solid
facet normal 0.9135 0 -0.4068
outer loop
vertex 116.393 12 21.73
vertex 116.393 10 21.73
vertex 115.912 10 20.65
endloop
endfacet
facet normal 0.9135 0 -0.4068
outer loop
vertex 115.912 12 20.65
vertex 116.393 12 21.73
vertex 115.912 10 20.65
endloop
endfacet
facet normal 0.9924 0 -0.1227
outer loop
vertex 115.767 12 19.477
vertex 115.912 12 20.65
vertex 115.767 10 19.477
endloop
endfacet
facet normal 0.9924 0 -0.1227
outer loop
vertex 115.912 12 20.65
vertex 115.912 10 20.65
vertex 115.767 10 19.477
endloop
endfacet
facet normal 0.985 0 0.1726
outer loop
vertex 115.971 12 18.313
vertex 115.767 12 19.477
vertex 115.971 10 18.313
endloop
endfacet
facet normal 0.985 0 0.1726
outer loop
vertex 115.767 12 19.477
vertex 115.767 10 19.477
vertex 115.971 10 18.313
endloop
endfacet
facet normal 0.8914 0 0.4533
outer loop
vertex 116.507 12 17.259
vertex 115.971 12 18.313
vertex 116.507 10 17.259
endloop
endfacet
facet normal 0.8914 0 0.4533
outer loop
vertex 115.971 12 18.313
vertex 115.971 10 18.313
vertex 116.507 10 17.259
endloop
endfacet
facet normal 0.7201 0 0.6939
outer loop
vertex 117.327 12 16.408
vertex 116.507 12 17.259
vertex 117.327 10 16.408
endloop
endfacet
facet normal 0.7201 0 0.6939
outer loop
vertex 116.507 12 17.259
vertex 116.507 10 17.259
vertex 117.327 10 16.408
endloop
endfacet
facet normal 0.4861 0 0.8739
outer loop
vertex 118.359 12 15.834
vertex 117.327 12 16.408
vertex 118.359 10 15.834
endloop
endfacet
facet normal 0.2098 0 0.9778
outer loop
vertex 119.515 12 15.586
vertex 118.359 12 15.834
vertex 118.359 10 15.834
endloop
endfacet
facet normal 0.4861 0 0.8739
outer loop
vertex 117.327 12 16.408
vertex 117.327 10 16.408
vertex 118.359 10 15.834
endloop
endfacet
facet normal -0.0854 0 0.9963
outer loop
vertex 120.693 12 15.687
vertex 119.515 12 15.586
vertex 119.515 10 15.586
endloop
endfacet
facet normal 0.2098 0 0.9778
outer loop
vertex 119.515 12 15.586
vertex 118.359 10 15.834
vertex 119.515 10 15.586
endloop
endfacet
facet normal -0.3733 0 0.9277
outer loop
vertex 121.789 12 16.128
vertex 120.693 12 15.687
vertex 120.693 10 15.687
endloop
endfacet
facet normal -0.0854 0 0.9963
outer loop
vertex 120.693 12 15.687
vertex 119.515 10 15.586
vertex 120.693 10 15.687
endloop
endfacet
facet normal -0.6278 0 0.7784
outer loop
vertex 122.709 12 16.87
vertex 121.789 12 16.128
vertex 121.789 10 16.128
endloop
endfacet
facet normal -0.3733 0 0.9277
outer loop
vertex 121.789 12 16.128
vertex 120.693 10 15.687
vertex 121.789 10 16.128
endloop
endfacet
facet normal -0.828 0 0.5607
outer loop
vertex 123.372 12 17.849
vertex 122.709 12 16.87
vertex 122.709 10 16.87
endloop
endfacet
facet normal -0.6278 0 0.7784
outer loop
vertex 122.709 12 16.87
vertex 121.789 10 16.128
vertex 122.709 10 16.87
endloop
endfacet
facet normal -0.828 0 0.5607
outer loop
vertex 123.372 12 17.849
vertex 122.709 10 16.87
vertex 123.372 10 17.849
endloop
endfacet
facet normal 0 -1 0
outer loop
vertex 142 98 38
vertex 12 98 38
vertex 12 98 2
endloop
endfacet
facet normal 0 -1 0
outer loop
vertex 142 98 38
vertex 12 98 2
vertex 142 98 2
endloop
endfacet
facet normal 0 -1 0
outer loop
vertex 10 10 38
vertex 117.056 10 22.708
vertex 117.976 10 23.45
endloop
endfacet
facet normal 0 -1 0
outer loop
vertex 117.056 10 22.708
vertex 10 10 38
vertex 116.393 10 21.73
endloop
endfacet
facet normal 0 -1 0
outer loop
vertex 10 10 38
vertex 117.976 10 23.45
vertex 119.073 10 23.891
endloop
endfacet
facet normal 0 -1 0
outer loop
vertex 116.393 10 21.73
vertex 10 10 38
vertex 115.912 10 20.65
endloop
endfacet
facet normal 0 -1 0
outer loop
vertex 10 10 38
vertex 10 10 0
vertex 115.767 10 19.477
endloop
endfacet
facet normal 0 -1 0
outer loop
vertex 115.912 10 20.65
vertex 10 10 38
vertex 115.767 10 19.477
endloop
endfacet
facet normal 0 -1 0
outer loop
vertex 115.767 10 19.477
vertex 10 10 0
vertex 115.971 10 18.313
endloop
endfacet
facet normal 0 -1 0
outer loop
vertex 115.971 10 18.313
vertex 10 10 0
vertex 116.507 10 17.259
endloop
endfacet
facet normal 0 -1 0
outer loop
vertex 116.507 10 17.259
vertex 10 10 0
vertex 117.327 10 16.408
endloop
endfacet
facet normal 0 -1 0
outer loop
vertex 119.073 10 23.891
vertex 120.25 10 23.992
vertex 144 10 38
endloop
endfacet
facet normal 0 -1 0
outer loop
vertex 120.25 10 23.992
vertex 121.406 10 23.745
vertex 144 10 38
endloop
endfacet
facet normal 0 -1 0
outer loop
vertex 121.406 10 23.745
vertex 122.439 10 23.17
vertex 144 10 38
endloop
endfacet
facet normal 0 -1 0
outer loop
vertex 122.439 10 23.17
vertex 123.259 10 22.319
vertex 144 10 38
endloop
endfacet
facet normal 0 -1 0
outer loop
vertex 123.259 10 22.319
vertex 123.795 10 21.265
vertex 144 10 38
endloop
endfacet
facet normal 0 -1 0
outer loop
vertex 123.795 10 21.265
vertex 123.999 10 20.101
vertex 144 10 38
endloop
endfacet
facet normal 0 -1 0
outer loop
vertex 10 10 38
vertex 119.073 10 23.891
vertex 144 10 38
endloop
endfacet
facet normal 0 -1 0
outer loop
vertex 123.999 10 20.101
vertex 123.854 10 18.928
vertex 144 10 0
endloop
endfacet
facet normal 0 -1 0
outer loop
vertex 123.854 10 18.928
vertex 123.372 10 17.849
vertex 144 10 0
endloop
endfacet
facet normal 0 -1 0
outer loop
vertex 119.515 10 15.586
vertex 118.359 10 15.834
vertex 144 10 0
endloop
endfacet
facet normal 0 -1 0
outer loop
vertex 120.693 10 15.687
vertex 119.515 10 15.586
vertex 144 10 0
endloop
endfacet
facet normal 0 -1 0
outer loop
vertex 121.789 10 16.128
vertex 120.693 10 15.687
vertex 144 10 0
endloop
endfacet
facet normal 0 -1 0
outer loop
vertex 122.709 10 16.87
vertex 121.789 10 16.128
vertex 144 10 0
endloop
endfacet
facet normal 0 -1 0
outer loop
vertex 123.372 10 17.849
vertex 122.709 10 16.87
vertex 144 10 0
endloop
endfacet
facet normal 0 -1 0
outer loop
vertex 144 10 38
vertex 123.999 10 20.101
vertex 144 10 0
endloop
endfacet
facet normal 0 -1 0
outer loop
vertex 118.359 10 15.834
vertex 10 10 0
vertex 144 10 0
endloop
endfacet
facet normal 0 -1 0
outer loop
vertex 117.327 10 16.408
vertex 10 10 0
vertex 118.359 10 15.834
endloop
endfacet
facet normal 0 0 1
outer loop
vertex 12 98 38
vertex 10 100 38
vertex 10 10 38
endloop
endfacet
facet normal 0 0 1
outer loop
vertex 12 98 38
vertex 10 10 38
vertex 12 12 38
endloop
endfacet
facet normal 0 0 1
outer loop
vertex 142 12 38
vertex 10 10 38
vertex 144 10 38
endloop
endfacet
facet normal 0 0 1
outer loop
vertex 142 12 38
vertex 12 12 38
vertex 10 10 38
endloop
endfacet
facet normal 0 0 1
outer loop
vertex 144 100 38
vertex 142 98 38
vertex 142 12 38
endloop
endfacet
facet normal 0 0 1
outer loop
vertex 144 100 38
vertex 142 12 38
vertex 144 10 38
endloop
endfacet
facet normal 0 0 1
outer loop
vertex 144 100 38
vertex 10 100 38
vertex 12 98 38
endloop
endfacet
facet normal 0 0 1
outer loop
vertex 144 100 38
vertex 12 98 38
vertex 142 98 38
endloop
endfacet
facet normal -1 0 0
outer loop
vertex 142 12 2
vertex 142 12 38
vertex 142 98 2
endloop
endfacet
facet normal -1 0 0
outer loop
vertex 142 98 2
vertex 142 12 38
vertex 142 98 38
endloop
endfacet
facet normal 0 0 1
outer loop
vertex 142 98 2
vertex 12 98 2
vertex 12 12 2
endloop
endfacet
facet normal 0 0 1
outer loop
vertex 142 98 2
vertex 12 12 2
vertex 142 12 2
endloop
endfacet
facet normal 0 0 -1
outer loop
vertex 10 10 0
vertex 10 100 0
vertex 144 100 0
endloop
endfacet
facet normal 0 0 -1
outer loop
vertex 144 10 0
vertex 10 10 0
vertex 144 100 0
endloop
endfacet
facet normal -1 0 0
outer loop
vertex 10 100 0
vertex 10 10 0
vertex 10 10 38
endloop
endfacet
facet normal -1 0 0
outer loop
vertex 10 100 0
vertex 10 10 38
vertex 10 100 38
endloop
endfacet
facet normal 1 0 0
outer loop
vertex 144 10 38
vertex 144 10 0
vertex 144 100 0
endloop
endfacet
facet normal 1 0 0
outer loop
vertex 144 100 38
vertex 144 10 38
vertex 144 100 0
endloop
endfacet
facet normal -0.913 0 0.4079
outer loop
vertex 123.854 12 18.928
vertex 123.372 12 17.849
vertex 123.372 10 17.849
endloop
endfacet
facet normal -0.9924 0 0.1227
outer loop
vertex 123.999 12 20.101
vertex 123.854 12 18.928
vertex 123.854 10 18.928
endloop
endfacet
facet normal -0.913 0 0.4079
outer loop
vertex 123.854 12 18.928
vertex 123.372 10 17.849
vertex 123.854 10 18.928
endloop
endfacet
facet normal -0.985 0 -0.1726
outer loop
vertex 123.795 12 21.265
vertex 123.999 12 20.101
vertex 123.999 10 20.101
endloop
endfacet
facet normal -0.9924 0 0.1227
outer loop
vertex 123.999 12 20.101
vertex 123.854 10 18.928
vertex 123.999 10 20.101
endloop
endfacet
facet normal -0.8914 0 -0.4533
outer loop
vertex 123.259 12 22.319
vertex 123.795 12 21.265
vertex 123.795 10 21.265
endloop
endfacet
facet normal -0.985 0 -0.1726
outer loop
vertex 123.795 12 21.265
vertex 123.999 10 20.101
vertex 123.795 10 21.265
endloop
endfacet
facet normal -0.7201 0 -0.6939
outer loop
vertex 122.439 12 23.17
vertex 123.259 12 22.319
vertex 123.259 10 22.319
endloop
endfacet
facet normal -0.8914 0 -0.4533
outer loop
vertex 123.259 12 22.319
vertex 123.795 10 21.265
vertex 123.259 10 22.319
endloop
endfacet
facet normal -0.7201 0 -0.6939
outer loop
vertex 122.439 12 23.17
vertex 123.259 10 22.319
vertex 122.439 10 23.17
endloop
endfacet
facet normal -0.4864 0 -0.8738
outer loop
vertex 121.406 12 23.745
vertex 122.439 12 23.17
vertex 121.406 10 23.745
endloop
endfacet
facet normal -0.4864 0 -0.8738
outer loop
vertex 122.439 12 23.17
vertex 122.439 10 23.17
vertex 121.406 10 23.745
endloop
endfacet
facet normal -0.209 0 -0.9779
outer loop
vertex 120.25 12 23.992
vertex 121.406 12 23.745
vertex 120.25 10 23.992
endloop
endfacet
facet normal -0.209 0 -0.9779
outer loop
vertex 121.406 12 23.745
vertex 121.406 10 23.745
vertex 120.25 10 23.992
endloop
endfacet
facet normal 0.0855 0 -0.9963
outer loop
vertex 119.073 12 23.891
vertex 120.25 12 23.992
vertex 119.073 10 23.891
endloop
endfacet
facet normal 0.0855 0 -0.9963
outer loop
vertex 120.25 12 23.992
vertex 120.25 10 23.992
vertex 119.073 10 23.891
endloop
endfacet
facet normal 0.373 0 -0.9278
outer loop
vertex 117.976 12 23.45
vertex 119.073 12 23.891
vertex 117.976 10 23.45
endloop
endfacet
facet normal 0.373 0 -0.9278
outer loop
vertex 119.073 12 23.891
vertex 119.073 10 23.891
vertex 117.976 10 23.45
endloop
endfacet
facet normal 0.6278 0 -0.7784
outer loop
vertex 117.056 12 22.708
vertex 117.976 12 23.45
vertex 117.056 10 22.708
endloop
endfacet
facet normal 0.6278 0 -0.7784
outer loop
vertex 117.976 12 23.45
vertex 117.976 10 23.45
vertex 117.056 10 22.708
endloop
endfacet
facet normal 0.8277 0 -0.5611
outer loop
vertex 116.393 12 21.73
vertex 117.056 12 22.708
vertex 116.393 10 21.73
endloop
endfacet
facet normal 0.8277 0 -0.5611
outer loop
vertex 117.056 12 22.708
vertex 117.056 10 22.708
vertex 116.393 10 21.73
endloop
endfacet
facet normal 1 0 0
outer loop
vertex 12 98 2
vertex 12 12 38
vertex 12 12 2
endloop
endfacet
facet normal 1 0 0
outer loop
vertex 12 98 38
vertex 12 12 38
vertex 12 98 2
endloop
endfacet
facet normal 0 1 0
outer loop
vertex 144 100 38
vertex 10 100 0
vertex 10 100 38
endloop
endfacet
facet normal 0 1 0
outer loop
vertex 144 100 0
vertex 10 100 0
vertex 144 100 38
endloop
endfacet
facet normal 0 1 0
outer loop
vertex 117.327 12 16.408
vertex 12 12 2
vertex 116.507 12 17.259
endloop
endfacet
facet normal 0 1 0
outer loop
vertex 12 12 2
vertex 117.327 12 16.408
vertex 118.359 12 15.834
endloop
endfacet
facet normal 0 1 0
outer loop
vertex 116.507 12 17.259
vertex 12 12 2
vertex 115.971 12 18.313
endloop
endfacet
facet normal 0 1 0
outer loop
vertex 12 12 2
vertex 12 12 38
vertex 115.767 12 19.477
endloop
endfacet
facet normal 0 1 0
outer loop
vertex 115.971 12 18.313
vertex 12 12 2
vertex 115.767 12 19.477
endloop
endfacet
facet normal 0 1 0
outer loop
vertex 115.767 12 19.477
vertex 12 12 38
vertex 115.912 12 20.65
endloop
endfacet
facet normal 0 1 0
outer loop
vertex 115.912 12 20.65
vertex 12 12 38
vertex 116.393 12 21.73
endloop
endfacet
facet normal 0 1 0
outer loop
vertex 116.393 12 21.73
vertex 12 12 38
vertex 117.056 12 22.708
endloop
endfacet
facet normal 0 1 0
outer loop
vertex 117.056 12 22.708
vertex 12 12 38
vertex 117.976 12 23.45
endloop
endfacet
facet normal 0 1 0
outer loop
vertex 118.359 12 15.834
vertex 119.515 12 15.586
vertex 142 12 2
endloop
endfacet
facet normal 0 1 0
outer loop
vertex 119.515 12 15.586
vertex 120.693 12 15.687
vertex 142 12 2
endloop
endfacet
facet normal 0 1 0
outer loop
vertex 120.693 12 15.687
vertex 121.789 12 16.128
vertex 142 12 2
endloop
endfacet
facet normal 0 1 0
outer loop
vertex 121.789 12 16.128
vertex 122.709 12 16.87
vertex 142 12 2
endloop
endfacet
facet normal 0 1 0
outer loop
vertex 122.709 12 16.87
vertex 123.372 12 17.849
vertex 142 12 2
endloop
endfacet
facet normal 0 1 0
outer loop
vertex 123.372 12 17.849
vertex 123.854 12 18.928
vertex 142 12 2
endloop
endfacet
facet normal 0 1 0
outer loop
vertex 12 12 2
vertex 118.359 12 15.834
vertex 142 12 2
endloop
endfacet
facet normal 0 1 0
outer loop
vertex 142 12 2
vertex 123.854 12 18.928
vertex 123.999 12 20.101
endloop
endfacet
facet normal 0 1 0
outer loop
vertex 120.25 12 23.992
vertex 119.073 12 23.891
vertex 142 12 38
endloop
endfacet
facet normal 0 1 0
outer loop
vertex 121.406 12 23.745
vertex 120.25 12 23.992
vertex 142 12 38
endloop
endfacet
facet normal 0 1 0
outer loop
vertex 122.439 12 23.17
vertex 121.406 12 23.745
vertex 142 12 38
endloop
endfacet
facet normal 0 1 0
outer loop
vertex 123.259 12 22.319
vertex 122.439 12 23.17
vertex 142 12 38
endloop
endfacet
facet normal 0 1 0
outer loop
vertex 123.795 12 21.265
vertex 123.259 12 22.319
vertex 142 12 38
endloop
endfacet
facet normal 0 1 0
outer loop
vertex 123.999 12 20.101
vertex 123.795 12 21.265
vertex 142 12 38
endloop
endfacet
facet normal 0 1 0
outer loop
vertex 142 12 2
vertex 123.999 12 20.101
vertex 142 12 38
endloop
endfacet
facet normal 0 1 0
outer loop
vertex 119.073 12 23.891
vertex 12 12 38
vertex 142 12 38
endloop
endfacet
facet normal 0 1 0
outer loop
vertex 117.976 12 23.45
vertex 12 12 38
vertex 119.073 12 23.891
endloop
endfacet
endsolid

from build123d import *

# Parameters (mm, degrees)
SKETCH_W        = 134
SKETCH_H        = 90
PAD_DEPTH       = 38
SKETCH001_W     = 130
SKETCH001_H     = 86
POCKET_DEPTH    = 36
SKETCH003_R     = 4
POCKET001_DEPTH = 5
SKETCH004_R     = 4
POCKET002_DEPTH = 5


with BuildPart() as part:
    # Sketch → Pad (new body)
    with BuildSketch(Plane.XY):
        with Locations((77, 55)):
            Rectangle(SKETCH_W, SKETCH_H)
    extrude(amount=PAD_DEPTH)

    # Sketch001 (on Face6 of Pad) → Pocket (cut)
    with BuildSketch(Plane.XY.offset(38)):
        with Locations((77, 55)):
            Rectangle(SKETCH001_W, SKETCH001_H)
    extrude(amount=-POCKET_DEPTH, mode=Mode.SUBTRACT)

    # Sketch003 (on Face1 of Pocket) → Pocket001 (cut)
    with BuildSketch(Plane.XZ.offset(-10)):
        with Locations((119.765617, 19.578506)):
            Circle(SKETCH003_R)
    extrude(amount=-POCKET001_DEPTH, mode=Mode.SUBTRACT)

    # Sketch004 (on Face1 of Pad) → Pocket002 (cut)
    with BuildSketch(Plane.XZ.offset(-10)):
        with Locations((120, 20)):
            Circle(SKETCH004_R)
    extrude(amount=-POCKET002_DEPTH, mode=Mode.SUBTRACT)


solid = part.part
